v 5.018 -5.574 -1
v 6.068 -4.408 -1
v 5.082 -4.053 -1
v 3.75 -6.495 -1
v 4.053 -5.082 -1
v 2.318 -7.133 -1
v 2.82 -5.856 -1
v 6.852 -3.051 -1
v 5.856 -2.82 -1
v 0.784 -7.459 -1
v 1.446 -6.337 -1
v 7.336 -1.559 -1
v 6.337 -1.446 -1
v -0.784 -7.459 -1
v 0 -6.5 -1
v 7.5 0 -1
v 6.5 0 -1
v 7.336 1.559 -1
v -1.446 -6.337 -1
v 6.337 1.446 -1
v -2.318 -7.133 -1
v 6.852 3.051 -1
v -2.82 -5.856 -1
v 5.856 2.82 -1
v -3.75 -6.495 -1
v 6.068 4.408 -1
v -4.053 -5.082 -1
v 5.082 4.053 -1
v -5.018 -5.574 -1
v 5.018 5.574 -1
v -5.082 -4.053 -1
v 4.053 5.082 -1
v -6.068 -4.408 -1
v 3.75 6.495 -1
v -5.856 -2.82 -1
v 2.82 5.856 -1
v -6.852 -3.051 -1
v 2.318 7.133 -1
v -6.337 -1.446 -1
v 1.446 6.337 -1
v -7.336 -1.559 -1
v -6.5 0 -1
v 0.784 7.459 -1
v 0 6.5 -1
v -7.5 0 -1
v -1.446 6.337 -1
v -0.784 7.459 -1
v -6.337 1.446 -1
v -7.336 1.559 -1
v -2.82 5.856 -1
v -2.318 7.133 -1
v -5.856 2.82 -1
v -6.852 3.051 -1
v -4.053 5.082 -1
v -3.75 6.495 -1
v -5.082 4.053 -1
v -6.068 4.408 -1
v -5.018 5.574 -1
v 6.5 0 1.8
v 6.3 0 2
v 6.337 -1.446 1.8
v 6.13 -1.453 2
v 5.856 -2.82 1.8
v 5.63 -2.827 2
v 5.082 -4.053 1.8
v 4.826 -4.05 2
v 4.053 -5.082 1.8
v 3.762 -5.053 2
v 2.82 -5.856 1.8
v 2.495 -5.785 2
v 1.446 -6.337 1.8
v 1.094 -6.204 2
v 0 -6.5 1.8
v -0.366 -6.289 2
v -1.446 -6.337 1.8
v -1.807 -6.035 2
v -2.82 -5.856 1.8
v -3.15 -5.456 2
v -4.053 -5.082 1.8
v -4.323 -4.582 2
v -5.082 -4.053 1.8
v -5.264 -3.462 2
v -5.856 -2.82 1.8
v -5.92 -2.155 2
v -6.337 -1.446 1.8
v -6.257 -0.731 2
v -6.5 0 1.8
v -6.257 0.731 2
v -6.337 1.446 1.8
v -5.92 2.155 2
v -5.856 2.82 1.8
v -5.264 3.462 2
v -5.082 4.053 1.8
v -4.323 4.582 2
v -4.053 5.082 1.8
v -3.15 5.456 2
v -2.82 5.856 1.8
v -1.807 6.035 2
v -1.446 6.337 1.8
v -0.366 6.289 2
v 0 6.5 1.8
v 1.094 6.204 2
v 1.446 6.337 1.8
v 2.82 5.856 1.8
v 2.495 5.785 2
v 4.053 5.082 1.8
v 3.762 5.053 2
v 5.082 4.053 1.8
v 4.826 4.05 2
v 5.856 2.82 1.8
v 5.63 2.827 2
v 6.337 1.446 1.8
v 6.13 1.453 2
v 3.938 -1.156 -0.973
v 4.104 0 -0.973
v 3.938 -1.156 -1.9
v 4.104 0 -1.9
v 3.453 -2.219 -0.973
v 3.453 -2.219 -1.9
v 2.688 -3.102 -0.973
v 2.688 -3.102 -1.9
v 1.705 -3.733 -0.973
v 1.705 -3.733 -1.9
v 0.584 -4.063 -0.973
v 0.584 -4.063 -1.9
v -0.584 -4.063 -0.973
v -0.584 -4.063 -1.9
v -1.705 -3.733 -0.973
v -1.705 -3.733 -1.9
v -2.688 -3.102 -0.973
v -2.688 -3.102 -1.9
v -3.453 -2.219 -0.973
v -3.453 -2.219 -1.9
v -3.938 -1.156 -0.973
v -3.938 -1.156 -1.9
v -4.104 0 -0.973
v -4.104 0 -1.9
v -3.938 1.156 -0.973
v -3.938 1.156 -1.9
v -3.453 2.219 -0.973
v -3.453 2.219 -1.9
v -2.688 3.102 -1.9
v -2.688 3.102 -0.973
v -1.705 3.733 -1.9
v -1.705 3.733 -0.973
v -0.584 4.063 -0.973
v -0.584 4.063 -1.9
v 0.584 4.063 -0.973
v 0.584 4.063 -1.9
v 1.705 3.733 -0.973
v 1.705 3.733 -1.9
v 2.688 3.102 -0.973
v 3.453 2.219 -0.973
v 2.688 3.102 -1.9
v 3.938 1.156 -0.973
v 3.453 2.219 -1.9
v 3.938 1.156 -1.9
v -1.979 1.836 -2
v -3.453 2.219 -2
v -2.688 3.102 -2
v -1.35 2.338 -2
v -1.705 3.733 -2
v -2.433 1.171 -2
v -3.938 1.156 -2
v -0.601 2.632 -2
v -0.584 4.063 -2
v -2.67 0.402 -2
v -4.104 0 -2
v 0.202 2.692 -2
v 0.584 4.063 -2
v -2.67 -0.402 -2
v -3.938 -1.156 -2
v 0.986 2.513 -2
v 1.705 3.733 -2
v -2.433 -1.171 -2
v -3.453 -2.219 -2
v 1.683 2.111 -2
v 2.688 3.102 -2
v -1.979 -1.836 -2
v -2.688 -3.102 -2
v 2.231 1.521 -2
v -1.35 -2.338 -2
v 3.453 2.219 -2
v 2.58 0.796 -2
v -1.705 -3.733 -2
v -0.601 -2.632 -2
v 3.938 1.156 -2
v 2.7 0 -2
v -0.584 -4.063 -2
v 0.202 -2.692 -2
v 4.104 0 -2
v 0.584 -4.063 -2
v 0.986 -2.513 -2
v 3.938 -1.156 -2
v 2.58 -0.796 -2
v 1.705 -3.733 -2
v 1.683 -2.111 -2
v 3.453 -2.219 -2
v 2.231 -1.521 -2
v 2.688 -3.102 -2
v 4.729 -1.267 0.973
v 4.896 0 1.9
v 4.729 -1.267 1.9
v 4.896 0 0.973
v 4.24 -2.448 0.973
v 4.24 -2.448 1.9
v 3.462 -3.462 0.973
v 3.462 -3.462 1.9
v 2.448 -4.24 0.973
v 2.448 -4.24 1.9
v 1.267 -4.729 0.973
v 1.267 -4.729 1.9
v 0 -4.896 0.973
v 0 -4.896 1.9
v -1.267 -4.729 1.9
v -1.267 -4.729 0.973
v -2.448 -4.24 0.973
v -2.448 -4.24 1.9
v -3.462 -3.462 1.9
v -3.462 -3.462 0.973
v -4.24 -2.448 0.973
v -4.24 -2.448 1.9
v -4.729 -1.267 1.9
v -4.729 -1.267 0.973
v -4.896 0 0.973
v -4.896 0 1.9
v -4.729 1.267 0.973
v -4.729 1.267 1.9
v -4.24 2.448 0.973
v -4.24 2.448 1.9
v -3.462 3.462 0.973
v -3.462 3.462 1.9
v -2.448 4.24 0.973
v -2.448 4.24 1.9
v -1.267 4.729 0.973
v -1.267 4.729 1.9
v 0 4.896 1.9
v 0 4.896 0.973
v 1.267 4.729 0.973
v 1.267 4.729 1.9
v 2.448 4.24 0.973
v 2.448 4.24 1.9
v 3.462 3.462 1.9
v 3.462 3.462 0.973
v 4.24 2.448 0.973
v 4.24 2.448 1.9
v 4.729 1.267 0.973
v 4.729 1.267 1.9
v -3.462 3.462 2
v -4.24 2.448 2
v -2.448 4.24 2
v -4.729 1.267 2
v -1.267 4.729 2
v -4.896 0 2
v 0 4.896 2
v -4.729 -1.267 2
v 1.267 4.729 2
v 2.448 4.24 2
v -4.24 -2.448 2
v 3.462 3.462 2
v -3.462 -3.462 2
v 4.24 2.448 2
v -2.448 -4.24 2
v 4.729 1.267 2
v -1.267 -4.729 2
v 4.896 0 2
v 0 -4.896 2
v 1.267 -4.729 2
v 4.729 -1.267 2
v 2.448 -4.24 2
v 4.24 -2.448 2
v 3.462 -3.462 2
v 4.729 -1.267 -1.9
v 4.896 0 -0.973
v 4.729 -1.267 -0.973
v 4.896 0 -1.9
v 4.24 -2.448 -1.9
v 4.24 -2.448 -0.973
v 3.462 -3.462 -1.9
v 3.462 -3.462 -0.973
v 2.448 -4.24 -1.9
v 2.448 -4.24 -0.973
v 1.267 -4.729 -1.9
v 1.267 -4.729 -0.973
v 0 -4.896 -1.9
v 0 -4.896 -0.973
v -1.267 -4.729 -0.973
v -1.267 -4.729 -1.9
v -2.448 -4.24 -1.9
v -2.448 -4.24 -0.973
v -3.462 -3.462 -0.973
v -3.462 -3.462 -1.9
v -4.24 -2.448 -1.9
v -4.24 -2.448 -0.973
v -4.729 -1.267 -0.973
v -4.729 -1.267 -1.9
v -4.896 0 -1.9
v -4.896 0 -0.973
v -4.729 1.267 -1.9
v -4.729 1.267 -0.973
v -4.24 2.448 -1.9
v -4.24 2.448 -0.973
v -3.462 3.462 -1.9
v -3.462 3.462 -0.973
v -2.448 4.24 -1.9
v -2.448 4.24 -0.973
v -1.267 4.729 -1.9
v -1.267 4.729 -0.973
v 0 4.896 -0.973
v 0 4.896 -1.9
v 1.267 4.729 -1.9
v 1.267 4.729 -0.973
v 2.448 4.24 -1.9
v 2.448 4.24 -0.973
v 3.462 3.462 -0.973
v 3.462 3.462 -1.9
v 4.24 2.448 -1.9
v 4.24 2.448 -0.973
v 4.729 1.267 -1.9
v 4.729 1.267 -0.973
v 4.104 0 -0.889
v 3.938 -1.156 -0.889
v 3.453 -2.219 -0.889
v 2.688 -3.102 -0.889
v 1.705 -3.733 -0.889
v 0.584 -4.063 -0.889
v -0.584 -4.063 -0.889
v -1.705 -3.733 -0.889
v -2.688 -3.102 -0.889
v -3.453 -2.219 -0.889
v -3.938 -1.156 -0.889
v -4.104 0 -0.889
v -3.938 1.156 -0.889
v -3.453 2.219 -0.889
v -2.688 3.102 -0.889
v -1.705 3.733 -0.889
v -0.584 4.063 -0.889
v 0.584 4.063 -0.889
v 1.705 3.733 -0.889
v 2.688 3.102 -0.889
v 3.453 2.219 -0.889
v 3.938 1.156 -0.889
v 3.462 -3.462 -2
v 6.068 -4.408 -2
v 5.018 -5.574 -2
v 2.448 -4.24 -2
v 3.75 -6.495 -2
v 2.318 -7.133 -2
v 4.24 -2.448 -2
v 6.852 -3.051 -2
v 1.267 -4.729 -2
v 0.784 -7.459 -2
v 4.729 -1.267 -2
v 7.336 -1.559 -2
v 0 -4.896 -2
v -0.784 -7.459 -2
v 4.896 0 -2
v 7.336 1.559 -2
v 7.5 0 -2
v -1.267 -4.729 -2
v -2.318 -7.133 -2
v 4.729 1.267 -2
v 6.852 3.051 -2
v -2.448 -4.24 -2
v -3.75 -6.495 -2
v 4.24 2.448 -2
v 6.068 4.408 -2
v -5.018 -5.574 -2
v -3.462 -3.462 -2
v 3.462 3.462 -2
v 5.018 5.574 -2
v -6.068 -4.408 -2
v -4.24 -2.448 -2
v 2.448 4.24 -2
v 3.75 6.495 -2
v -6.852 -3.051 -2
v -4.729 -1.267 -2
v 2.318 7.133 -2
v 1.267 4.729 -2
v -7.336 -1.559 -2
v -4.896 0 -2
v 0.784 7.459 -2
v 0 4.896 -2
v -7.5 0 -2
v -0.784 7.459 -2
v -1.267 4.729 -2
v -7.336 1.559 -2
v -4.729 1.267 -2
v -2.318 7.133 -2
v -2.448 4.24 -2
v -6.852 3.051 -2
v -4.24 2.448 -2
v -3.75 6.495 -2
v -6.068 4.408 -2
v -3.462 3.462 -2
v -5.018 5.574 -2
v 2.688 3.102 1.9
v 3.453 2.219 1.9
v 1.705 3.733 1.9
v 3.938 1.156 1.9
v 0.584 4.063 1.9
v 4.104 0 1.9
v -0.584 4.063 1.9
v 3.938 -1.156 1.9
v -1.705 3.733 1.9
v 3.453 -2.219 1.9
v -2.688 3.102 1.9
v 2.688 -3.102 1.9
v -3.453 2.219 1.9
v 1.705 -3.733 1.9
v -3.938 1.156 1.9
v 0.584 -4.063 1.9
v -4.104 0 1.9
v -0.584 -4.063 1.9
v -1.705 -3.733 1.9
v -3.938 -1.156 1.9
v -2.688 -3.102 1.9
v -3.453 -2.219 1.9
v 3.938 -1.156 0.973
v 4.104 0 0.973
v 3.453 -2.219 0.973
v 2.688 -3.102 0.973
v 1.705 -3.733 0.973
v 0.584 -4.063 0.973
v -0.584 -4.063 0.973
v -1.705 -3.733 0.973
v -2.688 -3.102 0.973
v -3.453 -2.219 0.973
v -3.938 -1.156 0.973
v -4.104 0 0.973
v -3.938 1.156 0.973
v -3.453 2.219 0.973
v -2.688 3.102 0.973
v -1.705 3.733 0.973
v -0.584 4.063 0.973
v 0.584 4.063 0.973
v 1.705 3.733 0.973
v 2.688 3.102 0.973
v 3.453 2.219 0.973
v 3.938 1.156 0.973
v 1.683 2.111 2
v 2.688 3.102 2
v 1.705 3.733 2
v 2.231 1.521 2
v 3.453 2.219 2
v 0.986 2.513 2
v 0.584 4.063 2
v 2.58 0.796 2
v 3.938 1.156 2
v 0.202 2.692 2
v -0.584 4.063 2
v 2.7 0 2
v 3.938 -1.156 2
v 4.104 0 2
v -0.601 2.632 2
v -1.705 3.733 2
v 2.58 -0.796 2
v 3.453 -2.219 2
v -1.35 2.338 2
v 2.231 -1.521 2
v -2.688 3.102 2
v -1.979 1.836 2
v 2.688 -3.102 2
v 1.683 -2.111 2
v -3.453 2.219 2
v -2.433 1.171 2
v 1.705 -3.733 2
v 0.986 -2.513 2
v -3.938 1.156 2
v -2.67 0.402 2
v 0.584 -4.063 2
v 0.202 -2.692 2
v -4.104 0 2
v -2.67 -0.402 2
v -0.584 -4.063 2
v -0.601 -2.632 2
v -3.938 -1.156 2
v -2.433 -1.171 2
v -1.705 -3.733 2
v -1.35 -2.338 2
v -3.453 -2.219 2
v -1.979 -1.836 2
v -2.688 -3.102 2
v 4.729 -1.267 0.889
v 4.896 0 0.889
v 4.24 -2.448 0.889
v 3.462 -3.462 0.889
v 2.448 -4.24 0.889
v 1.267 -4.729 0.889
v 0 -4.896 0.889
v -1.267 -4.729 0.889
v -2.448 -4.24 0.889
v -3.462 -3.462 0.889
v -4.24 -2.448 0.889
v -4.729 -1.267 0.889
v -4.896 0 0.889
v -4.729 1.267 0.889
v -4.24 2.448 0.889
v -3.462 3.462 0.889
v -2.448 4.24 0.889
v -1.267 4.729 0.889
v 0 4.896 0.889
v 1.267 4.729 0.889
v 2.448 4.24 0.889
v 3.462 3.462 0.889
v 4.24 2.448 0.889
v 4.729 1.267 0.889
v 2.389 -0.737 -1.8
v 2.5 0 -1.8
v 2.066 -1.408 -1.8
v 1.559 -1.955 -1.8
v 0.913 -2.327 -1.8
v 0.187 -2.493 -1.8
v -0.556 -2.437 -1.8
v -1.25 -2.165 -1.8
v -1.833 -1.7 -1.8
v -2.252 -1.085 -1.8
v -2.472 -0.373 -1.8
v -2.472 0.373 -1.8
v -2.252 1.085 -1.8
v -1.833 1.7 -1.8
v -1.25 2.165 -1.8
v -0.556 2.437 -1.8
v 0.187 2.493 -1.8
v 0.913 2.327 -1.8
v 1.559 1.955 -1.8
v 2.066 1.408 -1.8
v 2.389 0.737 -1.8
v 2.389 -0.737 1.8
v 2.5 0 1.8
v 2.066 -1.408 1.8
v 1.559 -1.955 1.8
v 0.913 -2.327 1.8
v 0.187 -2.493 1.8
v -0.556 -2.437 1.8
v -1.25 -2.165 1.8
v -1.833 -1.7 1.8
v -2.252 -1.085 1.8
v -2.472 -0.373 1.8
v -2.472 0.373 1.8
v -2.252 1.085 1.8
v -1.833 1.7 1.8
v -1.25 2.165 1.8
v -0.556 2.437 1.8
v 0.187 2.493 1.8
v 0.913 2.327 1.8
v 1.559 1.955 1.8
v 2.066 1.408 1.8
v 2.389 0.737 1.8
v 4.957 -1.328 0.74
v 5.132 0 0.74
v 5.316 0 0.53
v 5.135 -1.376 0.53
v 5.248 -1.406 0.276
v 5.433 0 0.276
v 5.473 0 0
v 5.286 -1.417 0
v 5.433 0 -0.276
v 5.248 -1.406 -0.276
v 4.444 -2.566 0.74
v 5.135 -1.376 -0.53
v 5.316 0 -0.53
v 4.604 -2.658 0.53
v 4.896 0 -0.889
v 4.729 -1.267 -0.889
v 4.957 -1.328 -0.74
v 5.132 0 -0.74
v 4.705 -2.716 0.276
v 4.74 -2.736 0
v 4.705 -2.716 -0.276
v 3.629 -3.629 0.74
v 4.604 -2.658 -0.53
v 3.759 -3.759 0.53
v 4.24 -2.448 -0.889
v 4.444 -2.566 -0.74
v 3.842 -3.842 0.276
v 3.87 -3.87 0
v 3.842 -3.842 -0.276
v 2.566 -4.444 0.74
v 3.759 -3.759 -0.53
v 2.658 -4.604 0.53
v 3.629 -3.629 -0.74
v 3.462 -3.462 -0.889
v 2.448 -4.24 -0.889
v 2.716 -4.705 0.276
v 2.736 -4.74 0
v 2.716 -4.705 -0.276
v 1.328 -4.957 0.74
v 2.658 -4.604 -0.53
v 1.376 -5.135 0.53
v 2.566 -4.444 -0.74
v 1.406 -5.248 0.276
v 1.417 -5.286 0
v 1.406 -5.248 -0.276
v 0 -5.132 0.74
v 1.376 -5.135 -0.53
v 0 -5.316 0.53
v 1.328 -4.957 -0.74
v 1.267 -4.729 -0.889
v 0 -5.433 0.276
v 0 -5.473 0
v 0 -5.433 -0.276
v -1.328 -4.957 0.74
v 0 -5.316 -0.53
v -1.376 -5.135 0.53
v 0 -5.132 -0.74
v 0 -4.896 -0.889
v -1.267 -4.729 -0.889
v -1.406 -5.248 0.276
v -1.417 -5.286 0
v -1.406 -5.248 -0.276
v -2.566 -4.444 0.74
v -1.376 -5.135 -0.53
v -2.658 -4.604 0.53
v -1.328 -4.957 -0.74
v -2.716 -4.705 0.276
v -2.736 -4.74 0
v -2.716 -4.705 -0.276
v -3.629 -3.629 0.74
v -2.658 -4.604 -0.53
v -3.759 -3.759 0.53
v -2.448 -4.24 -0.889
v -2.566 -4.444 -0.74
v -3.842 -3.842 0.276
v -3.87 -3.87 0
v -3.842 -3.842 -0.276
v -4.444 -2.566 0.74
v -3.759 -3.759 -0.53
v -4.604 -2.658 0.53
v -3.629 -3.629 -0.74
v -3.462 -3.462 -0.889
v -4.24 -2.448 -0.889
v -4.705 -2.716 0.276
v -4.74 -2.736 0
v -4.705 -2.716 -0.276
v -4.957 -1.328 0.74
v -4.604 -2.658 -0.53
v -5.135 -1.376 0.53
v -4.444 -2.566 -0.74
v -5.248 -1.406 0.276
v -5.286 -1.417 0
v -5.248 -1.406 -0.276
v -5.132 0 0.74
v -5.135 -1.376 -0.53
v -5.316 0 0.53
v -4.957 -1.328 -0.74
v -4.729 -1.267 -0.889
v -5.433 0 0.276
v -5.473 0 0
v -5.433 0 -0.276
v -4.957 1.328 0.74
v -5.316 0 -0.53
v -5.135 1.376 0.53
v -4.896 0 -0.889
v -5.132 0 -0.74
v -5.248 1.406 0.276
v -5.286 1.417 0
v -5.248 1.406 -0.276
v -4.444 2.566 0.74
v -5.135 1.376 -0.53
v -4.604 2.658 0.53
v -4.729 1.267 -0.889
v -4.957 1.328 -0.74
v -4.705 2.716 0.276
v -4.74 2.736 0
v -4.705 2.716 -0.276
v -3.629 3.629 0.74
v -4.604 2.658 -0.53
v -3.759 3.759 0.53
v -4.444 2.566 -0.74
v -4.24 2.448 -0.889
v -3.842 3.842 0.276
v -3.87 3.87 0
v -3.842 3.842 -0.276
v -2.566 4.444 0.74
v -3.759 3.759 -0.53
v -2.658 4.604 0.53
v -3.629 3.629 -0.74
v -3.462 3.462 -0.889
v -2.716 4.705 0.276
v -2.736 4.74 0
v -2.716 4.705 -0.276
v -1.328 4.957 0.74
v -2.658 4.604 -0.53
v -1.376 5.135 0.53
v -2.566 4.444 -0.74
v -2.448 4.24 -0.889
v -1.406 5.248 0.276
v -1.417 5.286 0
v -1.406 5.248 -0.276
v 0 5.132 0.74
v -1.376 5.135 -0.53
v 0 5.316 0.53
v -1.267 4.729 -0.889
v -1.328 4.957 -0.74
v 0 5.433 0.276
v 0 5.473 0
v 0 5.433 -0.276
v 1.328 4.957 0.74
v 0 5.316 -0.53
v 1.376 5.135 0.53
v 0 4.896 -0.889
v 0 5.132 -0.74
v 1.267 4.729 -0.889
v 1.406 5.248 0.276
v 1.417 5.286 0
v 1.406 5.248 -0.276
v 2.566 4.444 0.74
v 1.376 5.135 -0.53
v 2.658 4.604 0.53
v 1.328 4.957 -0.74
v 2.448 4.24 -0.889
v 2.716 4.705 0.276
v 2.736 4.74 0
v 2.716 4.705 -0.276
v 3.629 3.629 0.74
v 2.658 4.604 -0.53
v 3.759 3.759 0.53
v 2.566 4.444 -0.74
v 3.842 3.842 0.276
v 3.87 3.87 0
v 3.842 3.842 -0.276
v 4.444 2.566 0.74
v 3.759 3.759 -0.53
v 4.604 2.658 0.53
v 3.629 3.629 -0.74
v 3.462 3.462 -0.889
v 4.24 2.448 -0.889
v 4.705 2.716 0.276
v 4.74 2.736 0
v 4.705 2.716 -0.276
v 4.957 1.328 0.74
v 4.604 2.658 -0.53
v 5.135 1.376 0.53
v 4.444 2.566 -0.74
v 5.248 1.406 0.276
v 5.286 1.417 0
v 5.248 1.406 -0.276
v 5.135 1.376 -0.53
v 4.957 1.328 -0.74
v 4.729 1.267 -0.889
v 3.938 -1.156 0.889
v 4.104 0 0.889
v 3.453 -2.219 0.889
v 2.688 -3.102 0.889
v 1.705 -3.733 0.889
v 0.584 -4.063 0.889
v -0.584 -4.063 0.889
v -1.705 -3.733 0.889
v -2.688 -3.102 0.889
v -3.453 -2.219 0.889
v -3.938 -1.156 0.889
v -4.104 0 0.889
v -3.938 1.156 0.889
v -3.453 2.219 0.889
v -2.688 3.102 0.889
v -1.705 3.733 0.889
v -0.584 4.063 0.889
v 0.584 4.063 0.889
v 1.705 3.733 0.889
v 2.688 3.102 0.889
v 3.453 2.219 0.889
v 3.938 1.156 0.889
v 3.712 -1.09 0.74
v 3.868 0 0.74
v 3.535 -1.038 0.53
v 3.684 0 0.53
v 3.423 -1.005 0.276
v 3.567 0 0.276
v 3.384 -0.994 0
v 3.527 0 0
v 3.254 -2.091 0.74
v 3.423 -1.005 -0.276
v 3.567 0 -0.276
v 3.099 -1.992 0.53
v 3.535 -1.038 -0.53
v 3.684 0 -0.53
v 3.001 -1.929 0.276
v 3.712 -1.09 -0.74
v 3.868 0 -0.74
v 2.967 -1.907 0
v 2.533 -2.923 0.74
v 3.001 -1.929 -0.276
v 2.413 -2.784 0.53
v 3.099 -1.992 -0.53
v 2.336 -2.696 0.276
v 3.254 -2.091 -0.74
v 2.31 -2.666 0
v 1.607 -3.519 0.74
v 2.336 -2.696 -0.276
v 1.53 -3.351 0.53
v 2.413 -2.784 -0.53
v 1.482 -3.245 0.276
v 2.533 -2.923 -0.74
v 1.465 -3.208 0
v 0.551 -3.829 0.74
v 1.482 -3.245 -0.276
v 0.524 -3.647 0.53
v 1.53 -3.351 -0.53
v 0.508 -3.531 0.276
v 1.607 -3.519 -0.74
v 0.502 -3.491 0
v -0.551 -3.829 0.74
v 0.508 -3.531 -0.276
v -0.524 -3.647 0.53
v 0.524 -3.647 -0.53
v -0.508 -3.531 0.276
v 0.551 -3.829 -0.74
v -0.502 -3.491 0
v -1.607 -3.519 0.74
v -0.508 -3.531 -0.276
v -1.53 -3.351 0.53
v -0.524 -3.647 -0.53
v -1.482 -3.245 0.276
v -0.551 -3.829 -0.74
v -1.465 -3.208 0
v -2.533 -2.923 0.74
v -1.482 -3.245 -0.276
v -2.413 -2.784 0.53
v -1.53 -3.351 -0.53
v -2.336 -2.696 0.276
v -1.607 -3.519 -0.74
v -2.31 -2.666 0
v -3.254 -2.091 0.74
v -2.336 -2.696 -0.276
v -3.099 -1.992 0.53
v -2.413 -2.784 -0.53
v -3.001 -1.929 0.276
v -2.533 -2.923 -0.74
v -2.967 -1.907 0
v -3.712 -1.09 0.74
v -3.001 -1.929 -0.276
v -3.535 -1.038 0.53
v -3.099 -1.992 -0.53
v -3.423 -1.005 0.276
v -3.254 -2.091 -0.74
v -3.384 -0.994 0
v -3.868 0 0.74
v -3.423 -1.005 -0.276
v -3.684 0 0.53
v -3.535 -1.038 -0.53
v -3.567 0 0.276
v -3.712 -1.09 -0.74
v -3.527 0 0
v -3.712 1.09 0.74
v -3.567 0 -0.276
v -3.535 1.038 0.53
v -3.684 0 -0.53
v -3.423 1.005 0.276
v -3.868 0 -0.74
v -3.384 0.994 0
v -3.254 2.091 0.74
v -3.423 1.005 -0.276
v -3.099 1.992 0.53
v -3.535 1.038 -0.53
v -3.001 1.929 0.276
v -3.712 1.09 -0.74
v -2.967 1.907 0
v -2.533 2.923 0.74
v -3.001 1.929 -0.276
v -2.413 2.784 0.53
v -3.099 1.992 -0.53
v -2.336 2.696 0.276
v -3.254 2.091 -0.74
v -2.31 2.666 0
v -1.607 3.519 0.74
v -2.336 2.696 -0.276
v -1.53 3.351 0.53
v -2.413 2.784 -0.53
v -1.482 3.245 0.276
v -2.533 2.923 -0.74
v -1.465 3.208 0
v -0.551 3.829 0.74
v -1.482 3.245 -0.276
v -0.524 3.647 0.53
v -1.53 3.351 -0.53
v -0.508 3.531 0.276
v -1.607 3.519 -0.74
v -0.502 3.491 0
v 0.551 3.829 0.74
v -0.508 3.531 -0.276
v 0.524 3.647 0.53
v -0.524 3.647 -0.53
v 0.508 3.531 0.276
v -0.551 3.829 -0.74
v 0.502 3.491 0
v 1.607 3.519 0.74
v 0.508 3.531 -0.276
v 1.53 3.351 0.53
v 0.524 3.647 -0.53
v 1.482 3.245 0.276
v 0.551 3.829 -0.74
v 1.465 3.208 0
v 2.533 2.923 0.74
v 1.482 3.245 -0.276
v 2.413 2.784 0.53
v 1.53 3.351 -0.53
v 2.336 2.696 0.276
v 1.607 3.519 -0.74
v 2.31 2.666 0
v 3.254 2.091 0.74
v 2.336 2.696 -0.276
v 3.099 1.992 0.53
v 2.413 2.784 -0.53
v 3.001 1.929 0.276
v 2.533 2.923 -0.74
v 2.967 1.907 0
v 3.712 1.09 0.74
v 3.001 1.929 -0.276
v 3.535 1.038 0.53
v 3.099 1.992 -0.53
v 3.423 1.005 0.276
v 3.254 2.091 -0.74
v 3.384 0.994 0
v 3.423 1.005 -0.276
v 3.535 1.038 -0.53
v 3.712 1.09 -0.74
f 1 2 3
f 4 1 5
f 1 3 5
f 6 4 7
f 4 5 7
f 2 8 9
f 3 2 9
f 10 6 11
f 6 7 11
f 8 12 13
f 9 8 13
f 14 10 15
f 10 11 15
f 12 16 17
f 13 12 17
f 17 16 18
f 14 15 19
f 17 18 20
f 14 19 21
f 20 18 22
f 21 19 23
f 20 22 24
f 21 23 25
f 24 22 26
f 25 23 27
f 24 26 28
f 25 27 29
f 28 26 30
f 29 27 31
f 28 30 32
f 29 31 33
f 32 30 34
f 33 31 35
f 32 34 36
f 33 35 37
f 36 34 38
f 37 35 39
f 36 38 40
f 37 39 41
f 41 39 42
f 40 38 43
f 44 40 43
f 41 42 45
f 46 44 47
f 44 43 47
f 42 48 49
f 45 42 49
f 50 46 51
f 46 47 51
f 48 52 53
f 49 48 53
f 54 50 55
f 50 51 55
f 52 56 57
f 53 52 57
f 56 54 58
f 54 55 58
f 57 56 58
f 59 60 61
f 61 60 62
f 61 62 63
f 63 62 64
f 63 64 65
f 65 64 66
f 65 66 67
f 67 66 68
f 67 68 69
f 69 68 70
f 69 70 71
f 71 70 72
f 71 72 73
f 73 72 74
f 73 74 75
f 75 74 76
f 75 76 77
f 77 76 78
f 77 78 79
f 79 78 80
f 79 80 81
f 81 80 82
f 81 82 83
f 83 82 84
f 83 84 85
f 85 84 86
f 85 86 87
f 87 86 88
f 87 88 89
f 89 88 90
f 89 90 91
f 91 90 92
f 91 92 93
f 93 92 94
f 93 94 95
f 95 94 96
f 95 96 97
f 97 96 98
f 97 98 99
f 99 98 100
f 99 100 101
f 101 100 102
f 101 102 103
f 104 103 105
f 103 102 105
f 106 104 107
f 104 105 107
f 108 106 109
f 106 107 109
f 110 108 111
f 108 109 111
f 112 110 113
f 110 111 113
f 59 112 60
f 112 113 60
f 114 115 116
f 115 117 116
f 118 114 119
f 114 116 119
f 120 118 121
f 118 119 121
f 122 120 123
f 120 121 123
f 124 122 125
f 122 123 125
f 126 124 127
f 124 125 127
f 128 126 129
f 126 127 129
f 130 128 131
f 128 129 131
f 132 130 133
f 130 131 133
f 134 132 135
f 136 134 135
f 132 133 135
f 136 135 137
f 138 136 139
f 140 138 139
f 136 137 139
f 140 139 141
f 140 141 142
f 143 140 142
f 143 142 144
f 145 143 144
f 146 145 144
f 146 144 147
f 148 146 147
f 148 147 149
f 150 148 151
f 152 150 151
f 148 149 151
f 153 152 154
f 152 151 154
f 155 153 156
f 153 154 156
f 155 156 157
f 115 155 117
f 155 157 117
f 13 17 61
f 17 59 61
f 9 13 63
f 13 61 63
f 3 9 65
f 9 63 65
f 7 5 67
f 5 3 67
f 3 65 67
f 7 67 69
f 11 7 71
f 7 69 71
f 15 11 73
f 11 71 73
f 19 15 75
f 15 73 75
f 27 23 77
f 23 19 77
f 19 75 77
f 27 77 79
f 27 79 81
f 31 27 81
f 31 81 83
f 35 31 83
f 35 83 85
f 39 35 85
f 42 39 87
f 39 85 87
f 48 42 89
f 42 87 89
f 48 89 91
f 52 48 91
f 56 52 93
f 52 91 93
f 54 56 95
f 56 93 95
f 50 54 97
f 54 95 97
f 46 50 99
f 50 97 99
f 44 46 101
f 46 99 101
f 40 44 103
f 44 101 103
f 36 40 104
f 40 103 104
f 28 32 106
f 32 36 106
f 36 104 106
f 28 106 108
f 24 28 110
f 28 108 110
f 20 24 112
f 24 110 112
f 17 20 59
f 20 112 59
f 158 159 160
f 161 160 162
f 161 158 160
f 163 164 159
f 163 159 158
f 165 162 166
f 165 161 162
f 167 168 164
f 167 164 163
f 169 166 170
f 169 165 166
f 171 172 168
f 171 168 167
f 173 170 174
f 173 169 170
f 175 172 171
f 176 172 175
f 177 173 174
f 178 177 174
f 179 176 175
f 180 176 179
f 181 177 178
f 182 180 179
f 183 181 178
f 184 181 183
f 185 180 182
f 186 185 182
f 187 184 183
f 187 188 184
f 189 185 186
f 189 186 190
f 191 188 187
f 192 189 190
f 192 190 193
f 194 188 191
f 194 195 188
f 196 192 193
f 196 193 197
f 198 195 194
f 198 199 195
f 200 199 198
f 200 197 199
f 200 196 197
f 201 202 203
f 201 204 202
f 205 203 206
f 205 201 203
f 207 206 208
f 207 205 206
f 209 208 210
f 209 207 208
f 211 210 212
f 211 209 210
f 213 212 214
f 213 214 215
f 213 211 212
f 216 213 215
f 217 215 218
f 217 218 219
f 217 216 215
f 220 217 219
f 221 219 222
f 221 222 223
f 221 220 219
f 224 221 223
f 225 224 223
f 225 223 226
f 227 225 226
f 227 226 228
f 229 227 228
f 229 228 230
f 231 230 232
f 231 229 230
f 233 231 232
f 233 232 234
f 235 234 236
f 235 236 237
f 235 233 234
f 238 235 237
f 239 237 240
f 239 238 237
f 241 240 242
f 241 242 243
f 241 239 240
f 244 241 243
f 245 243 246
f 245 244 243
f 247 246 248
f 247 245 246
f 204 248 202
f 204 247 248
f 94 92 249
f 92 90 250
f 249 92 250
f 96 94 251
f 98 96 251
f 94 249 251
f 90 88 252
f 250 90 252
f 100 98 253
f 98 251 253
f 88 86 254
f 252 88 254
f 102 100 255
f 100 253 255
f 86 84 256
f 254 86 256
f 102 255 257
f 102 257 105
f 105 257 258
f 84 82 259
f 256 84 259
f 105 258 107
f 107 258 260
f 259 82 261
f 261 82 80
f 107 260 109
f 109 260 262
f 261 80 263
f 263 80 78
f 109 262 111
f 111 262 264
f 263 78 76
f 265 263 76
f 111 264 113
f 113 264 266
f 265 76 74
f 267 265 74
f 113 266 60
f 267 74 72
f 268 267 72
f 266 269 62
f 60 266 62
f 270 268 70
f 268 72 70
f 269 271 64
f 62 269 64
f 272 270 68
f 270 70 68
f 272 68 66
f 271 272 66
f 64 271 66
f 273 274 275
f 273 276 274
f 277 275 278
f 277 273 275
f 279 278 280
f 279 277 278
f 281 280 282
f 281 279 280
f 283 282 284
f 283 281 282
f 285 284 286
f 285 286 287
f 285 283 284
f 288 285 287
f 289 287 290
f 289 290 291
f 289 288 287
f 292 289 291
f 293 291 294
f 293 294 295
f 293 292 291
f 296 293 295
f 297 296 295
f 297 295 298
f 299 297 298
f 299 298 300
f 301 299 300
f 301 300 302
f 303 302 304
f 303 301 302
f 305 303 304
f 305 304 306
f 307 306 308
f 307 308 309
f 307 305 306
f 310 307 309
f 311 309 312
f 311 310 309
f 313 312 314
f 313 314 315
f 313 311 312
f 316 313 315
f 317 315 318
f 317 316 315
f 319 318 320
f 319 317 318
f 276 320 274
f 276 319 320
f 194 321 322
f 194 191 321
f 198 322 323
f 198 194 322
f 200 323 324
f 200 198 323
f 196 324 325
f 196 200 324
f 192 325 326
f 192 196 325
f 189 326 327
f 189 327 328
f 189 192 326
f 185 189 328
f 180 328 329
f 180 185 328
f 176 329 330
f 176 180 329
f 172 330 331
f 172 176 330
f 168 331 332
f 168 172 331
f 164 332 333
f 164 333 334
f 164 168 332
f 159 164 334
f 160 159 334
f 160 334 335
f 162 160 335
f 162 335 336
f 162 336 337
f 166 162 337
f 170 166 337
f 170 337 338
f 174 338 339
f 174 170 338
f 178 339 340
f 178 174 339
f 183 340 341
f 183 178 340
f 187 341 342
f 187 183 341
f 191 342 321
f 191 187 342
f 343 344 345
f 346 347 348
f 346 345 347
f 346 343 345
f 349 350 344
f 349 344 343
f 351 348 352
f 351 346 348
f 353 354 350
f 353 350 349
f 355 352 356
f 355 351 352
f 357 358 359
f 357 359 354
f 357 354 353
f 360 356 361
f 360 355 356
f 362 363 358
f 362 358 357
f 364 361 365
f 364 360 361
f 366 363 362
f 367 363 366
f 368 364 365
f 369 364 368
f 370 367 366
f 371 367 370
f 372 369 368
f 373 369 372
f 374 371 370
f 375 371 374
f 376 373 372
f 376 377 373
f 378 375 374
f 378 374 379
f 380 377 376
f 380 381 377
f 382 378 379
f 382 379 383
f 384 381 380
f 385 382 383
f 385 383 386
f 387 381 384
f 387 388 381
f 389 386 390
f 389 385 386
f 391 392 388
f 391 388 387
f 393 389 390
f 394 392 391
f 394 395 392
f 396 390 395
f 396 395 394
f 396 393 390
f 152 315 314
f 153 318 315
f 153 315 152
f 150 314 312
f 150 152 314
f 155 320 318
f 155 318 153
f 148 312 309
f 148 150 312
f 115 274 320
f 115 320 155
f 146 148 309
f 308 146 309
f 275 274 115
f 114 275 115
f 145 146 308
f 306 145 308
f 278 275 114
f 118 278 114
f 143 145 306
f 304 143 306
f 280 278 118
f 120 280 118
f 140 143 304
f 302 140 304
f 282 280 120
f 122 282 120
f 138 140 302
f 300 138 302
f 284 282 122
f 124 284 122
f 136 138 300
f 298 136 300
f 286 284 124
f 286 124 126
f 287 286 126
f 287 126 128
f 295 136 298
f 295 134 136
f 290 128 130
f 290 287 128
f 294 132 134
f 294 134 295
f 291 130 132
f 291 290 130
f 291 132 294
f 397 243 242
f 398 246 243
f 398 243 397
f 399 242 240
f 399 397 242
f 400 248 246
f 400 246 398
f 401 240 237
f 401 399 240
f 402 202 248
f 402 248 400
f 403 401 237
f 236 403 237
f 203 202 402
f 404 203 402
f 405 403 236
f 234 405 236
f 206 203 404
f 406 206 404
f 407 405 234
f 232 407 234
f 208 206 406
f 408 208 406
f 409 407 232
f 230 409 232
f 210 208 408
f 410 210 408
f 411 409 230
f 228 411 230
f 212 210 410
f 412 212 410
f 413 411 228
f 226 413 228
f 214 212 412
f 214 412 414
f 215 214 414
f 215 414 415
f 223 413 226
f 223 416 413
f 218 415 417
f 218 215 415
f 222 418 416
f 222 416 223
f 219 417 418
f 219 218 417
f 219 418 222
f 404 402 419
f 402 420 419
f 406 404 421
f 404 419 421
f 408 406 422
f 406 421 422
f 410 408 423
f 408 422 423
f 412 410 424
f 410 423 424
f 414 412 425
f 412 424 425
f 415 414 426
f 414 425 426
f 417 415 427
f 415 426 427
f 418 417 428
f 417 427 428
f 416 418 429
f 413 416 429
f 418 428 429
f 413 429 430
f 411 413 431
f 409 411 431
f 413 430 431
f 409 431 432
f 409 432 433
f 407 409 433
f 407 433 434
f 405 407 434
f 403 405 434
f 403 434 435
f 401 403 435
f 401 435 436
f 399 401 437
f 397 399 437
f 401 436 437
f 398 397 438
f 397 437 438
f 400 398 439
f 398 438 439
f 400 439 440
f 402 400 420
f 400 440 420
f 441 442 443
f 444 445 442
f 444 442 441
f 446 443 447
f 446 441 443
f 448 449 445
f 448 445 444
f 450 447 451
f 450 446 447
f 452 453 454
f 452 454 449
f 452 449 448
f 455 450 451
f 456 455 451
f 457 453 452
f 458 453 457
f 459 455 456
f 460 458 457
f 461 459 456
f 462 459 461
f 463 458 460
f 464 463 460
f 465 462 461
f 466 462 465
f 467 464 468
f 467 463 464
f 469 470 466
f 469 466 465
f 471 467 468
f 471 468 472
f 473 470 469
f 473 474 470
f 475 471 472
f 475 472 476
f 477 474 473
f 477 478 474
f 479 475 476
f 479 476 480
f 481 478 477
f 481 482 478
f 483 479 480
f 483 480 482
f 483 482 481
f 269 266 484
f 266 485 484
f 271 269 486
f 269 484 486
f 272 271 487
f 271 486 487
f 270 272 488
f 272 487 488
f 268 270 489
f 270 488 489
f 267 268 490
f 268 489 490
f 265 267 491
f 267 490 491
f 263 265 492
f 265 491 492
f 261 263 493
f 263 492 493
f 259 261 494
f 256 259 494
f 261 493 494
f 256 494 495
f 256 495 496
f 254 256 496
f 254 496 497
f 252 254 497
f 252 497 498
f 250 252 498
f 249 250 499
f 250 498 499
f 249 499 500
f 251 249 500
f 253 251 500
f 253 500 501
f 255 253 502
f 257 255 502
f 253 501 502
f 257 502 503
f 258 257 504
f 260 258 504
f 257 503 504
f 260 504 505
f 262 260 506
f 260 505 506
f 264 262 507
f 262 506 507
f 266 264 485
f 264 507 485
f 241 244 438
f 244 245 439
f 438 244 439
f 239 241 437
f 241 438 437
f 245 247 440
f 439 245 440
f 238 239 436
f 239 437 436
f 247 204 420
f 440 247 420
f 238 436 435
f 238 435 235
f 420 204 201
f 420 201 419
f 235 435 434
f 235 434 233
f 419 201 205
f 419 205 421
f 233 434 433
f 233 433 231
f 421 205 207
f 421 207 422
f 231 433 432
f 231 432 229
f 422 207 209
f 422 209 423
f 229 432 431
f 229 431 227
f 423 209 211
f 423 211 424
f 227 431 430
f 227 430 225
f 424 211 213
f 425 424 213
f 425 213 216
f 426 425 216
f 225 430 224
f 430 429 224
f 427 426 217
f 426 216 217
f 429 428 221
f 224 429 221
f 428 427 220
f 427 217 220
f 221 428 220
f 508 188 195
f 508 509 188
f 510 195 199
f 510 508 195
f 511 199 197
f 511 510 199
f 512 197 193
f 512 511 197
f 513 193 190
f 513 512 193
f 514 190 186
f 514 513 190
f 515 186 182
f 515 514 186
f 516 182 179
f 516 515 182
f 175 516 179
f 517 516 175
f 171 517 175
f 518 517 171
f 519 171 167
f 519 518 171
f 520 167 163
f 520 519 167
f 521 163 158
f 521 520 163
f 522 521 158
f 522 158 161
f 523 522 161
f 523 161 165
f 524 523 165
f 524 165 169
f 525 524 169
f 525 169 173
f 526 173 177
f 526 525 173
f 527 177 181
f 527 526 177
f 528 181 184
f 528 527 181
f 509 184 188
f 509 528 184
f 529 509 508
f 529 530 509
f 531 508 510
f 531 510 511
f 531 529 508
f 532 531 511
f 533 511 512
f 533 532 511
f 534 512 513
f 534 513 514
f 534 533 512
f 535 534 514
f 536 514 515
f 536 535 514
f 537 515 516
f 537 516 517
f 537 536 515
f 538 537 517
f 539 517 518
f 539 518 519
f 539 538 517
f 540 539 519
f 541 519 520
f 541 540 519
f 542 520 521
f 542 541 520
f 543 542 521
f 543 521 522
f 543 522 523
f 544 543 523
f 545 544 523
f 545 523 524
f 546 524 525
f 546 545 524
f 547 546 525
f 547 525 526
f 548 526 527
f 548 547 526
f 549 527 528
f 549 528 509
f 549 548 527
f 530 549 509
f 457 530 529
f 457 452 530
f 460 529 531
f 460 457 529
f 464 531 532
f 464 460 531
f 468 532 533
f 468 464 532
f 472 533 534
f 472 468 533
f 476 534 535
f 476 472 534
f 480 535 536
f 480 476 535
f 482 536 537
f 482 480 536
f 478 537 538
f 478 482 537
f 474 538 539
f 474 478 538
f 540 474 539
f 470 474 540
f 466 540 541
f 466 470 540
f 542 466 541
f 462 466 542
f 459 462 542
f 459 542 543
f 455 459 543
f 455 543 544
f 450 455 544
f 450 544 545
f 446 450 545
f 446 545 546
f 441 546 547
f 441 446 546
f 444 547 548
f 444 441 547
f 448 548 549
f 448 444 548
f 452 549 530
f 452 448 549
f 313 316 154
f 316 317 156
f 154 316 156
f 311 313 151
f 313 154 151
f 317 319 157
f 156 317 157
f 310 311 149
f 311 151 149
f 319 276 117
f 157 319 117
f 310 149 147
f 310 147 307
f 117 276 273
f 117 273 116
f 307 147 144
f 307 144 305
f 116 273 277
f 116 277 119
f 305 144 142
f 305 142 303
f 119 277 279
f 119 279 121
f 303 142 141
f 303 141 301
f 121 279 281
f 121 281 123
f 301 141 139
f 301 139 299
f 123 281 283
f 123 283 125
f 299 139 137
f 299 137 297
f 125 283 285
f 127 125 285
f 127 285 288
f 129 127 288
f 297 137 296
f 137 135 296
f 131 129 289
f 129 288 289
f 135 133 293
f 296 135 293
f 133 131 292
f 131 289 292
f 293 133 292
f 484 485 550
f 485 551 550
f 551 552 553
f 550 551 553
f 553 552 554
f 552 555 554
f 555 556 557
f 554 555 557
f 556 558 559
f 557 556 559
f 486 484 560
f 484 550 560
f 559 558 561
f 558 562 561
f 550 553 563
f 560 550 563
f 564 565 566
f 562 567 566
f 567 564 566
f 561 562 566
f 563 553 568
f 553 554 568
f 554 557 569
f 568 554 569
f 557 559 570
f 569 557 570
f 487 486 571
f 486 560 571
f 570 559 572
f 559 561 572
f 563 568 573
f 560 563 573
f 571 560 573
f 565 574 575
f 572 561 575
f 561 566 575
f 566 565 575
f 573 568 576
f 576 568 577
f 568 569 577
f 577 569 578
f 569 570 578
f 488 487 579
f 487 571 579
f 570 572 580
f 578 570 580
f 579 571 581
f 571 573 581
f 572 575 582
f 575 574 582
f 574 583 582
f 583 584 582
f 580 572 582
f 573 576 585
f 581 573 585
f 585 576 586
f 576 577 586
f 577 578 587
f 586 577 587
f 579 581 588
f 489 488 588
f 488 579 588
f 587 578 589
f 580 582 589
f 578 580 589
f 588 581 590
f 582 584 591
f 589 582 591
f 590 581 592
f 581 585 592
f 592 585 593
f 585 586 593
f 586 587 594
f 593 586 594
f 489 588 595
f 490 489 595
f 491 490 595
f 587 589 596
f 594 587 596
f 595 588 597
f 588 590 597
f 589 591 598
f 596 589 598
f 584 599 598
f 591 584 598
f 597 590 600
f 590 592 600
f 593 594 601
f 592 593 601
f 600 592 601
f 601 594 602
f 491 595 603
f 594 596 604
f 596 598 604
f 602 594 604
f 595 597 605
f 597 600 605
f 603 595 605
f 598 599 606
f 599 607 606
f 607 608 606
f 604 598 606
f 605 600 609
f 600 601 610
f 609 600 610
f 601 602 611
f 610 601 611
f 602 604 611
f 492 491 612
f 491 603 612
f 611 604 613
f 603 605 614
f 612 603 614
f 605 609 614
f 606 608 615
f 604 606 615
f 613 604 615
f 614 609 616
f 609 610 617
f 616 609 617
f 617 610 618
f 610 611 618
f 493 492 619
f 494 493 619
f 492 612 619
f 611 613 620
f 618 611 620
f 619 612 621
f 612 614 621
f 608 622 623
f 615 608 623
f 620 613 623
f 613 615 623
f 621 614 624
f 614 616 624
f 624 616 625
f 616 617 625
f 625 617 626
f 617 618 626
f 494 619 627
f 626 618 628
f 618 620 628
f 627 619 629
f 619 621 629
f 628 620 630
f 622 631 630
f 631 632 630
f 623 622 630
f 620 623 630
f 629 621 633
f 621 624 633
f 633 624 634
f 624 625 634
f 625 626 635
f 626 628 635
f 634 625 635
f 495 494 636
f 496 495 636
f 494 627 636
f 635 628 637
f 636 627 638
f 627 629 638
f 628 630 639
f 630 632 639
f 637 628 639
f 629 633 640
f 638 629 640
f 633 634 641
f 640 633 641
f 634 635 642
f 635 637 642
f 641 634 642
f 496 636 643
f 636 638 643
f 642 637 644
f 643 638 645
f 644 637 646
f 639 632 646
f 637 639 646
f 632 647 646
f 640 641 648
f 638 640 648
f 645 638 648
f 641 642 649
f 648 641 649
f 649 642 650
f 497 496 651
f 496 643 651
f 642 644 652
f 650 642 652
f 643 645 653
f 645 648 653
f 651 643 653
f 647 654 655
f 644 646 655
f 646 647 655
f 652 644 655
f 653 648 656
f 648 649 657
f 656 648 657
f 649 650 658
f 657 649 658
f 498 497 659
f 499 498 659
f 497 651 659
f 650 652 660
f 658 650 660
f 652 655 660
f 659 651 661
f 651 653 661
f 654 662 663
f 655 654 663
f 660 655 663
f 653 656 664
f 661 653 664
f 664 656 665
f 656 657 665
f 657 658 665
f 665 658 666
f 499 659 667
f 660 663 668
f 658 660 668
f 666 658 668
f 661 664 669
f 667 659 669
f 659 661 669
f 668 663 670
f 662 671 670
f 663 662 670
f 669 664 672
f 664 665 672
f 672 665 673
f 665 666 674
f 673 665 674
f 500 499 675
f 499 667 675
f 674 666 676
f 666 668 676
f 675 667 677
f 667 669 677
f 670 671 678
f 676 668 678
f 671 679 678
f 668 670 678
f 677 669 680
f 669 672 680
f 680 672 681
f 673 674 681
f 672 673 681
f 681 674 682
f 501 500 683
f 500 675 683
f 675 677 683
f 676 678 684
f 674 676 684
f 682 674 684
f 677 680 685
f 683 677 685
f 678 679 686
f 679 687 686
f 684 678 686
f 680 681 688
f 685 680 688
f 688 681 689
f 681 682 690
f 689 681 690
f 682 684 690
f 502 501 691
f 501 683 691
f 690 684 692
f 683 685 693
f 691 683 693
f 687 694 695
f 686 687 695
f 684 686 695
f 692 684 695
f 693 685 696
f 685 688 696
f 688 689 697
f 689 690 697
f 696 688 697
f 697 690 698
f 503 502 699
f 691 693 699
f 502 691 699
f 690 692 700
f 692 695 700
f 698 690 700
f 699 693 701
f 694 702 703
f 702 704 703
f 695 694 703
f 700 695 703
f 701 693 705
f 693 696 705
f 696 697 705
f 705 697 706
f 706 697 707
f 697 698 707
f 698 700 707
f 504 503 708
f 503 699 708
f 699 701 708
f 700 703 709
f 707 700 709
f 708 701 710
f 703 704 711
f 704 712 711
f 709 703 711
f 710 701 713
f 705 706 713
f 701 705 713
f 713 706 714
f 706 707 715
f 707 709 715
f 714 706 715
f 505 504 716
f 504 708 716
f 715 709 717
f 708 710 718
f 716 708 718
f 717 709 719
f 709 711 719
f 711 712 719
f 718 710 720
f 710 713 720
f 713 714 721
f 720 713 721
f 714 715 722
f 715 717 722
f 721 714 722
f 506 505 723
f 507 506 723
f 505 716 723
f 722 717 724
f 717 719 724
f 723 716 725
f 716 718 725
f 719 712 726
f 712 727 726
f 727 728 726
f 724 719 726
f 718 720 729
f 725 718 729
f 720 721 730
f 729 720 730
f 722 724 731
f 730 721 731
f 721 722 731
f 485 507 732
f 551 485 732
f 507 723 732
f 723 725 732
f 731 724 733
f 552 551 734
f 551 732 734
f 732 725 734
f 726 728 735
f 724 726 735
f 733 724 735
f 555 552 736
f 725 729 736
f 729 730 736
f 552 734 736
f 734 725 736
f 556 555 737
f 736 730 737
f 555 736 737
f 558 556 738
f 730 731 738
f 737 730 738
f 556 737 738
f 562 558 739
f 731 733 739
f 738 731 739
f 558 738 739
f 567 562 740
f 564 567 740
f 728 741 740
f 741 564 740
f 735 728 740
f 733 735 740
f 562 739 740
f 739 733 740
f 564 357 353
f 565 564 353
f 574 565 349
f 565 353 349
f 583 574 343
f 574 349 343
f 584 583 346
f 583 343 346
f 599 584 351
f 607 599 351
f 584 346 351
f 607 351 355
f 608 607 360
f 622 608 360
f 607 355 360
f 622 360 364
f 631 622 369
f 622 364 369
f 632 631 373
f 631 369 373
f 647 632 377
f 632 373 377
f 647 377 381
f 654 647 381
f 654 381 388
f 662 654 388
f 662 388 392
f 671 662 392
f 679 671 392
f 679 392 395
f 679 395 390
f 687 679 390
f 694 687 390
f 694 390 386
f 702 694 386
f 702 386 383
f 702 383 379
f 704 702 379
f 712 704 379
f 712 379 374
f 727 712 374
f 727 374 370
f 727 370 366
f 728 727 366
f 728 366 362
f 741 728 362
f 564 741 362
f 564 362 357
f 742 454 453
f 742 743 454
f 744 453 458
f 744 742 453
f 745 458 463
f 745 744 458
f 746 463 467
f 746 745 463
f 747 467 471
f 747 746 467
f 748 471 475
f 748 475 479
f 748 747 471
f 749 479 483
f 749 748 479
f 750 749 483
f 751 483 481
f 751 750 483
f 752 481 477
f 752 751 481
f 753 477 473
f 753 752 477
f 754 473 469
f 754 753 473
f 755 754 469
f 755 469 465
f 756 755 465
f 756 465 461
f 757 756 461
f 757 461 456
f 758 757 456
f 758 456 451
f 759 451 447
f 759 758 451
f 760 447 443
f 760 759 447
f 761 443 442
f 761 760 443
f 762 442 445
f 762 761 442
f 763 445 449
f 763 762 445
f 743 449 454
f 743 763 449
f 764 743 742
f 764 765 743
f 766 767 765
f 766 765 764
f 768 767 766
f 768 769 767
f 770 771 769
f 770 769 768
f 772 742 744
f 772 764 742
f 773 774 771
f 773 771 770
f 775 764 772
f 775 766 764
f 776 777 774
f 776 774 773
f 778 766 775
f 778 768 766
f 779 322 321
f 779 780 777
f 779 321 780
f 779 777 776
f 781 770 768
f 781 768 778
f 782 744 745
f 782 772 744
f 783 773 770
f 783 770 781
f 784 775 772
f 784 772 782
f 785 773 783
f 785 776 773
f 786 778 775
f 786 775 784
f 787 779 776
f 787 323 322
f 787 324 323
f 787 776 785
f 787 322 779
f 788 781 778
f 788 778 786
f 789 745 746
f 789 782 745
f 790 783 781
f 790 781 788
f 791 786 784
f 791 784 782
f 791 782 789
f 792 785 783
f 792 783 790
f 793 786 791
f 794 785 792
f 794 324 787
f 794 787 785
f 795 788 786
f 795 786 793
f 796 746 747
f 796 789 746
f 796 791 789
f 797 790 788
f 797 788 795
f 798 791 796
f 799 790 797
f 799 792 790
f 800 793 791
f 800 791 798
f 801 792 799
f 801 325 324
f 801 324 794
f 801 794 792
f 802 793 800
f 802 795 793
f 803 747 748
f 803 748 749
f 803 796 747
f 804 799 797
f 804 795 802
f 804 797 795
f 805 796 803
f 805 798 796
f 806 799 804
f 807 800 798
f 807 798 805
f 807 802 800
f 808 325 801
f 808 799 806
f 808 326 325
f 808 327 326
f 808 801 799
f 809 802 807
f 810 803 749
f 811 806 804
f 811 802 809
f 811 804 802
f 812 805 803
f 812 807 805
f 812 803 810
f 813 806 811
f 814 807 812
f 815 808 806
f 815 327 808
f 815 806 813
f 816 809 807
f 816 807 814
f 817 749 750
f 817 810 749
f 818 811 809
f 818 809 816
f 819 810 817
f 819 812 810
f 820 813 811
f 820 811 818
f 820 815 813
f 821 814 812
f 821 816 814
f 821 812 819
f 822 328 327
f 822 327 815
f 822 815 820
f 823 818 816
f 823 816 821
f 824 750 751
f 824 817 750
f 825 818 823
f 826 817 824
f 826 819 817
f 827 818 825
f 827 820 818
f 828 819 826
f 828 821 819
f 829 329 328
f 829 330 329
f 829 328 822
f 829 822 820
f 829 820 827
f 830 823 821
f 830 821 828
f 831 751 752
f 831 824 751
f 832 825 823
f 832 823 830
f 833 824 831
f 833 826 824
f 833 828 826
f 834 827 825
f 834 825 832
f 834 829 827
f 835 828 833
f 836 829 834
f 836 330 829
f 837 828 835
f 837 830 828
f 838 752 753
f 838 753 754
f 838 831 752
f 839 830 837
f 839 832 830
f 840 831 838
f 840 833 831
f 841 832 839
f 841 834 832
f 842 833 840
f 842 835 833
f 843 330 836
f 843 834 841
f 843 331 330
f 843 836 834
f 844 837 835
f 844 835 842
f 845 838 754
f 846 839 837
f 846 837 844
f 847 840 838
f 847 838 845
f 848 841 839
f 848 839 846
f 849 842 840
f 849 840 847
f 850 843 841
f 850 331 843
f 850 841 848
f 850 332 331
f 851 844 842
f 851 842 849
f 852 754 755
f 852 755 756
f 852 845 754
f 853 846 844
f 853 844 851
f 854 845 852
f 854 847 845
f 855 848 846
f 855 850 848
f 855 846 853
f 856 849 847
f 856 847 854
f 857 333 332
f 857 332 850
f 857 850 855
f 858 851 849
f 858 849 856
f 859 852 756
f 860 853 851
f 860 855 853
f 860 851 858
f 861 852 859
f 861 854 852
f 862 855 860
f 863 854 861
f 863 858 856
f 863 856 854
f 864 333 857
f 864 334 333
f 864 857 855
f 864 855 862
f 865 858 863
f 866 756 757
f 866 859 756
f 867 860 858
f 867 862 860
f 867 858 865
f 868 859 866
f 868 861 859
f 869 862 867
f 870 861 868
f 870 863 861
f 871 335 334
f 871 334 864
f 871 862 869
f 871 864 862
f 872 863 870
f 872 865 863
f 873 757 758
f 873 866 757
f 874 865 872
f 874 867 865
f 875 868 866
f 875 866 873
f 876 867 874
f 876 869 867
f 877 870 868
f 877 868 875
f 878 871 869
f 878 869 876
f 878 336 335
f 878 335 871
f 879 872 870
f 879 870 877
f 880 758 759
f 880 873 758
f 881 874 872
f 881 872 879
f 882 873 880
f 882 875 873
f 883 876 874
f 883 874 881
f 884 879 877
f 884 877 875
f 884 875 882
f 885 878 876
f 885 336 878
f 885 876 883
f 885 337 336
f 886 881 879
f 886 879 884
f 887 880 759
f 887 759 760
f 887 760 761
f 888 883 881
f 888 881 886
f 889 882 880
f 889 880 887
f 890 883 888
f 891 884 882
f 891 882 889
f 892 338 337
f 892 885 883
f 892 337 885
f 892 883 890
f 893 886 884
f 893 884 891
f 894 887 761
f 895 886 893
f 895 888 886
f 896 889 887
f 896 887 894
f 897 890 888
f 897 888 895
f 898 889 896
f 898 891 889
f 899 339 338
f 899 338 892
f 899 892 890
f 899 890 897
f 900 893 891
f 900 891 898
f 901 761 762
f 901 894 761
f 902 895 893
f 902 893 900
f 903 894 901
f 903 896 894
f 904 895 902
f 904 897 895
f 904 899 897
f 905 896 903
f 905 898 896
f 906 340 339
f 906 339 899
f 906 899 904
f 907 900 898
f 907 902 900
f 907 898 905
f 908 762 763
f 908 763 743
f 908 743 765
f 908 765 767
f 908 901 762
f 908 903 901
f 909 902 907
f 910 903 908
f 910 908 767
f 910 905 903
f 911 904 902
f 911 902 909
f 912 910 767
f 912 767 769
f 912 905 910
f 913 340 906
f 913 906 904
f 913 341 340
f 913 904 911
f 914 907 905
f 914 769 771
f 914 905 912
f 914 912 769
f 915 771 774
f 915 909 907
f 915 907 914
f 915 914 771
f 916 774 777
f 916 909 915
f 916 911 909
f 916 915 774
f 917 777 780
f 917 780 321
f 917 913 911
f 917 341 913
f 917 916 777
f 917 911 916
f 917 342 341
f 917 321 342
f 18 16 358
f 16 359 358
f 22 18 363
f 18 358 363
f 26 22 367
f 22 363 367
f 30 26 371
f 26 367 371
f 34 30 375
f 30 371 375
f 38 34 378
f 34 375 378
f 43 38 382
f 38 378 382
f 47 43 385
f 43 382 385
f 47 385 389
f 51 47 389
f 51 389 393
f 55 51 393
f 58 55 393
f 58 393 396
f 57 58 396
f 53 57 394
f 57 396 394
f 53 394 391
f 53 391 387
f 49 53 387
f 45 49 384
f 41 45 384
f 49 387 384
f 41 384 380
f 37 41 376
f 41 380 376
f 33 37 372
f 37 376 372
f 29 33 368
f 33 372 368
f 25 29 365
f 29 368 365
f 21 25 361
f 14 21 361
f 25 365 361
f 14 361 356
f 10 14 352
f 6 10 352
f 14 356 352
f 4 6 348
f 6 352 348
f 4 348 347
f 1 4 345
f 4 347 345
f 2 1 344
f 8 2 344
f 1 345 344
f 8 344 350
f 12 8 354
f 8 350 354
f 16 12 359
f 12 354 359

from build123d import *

# Parameters (mm, degrees)
SKETCH5_W = 0.927052779
SKETCH5_H = 0.791208792
SKETCH6_W = 1
SKETCH6_H = 2.604395604


with BuildPart() as part:
    # Sketch1 → Revolve1 (revolve)
    with BuildSketch(Plane(origin=(0, 0, 0), x_dir=(0, 0, -1), z_dir=(1, 0, 0)), mode=Mode.PRIVATE) as revolve1_sk:
        with BuildLine():
            Line((1.8, 6.5), (-1.8, 6.5))
            Line((-1.8, 6.5), (-2, 6.3))
            Line((-2, 6.3), (-2, 4.895604396))
            Line((-2, 4.895604396), (-0.888888889, 4.895604396))
            ThreePointArc((-0.888888889, 4.895604396), (0, 5.472947221), (0.888888889, 4.895604396))
            Line((0.888888889, 4.895604396), (2, 4.895604396))
            Line((2, 4.895604396), (2, 6.3))
            Line((2, 6.3), (1.8, 6.5))
        make_face()
    revolve(revolve1_sk.sketch.rotate(Axis((0, 0, 2), (0, 0, -1)), 90), axis=Axis((0, 0, 2), (0, 0, -1)))

    # Sketch6 → Revolve6 (revolve)
    with BuildSketch(Plane(origin=(0, 0, 0), x_dir=(0, 0, -1), z_dir=(1, 0, 0)), mode=Mode.PRIVATE) as revolve6_sk:
        with Locations((1.5, 6.197802198)):
            Rectangle(SKETCH6_W, SKETCH6_H)
    revolve(revolve6_sk.sketch.rotate(Axis((0, 0, -2), (0, 0, 1)), 270), axis=Axis((0, 0, -2), (0, 0, 1)))


with BuildPart() as body_2:
    # Sketch3 → Revolve3 (revolve)
    with BuildSketch(Plane(origin=(0, 0, 0), x_dir=(0, 0, -1), z_dir=(1, 0, 0)), mode=Mode.PRIVATE) as revolve3_sk:
        with BuildLine():
            Line((-2, 4.104395604), (-0.888888889, 4.104395604))
            ThreePointArc((-0.888888889, 4.104395604), (0, 3.527052779), (0.888888889, 4.104395604))
            Line((0.888888889, 4.104395604), (2, 4.104395604))
            Line((2, 4.104395604), (2, 2.7))
            Line((2, 2.7), (1.8, 2.5))
            Line((1.8, 2.5), (-1.8, 2.5))
            Line((-1.8, 2.5), (-2, 2.7))
            Line((-2, 2.7), (-2, 4.104395604))
        make_face()
    revolve(revolve3_sk.sketch.rotate(Axis((0, 0, 2), (0, 0, -1)), 90), axis=Axis((0, 0, 2), (0, 0, -1)))


with BuildPart() as body_3:
    # Sketch5 → Revolve5 (revolve)
    with BuildSketch(Plane(origin=(0, 0, 0), x_dir=(0, 0, -1), z_dir=(1, 0, 0)), mode=Mode.PRIVATE) as revolve5_sk:
        with Locations((-1.436473611, 4.5)):
            Rectangle(SKETCH5_W, SKETCH5_H)
        with Locations((1.436473611, 4.5)):
            Rectangle(SKETCH5_W, SKETCH5_H)
    revolve(revolve5_sk.sketch.rotate(Axis((0, 0, 2), (0, 0, -1)), 90), axis=Axis((0, 0, 2), (0, 0, -1)))


solid = Compound([part.part, body_2.part, body_3.part])
